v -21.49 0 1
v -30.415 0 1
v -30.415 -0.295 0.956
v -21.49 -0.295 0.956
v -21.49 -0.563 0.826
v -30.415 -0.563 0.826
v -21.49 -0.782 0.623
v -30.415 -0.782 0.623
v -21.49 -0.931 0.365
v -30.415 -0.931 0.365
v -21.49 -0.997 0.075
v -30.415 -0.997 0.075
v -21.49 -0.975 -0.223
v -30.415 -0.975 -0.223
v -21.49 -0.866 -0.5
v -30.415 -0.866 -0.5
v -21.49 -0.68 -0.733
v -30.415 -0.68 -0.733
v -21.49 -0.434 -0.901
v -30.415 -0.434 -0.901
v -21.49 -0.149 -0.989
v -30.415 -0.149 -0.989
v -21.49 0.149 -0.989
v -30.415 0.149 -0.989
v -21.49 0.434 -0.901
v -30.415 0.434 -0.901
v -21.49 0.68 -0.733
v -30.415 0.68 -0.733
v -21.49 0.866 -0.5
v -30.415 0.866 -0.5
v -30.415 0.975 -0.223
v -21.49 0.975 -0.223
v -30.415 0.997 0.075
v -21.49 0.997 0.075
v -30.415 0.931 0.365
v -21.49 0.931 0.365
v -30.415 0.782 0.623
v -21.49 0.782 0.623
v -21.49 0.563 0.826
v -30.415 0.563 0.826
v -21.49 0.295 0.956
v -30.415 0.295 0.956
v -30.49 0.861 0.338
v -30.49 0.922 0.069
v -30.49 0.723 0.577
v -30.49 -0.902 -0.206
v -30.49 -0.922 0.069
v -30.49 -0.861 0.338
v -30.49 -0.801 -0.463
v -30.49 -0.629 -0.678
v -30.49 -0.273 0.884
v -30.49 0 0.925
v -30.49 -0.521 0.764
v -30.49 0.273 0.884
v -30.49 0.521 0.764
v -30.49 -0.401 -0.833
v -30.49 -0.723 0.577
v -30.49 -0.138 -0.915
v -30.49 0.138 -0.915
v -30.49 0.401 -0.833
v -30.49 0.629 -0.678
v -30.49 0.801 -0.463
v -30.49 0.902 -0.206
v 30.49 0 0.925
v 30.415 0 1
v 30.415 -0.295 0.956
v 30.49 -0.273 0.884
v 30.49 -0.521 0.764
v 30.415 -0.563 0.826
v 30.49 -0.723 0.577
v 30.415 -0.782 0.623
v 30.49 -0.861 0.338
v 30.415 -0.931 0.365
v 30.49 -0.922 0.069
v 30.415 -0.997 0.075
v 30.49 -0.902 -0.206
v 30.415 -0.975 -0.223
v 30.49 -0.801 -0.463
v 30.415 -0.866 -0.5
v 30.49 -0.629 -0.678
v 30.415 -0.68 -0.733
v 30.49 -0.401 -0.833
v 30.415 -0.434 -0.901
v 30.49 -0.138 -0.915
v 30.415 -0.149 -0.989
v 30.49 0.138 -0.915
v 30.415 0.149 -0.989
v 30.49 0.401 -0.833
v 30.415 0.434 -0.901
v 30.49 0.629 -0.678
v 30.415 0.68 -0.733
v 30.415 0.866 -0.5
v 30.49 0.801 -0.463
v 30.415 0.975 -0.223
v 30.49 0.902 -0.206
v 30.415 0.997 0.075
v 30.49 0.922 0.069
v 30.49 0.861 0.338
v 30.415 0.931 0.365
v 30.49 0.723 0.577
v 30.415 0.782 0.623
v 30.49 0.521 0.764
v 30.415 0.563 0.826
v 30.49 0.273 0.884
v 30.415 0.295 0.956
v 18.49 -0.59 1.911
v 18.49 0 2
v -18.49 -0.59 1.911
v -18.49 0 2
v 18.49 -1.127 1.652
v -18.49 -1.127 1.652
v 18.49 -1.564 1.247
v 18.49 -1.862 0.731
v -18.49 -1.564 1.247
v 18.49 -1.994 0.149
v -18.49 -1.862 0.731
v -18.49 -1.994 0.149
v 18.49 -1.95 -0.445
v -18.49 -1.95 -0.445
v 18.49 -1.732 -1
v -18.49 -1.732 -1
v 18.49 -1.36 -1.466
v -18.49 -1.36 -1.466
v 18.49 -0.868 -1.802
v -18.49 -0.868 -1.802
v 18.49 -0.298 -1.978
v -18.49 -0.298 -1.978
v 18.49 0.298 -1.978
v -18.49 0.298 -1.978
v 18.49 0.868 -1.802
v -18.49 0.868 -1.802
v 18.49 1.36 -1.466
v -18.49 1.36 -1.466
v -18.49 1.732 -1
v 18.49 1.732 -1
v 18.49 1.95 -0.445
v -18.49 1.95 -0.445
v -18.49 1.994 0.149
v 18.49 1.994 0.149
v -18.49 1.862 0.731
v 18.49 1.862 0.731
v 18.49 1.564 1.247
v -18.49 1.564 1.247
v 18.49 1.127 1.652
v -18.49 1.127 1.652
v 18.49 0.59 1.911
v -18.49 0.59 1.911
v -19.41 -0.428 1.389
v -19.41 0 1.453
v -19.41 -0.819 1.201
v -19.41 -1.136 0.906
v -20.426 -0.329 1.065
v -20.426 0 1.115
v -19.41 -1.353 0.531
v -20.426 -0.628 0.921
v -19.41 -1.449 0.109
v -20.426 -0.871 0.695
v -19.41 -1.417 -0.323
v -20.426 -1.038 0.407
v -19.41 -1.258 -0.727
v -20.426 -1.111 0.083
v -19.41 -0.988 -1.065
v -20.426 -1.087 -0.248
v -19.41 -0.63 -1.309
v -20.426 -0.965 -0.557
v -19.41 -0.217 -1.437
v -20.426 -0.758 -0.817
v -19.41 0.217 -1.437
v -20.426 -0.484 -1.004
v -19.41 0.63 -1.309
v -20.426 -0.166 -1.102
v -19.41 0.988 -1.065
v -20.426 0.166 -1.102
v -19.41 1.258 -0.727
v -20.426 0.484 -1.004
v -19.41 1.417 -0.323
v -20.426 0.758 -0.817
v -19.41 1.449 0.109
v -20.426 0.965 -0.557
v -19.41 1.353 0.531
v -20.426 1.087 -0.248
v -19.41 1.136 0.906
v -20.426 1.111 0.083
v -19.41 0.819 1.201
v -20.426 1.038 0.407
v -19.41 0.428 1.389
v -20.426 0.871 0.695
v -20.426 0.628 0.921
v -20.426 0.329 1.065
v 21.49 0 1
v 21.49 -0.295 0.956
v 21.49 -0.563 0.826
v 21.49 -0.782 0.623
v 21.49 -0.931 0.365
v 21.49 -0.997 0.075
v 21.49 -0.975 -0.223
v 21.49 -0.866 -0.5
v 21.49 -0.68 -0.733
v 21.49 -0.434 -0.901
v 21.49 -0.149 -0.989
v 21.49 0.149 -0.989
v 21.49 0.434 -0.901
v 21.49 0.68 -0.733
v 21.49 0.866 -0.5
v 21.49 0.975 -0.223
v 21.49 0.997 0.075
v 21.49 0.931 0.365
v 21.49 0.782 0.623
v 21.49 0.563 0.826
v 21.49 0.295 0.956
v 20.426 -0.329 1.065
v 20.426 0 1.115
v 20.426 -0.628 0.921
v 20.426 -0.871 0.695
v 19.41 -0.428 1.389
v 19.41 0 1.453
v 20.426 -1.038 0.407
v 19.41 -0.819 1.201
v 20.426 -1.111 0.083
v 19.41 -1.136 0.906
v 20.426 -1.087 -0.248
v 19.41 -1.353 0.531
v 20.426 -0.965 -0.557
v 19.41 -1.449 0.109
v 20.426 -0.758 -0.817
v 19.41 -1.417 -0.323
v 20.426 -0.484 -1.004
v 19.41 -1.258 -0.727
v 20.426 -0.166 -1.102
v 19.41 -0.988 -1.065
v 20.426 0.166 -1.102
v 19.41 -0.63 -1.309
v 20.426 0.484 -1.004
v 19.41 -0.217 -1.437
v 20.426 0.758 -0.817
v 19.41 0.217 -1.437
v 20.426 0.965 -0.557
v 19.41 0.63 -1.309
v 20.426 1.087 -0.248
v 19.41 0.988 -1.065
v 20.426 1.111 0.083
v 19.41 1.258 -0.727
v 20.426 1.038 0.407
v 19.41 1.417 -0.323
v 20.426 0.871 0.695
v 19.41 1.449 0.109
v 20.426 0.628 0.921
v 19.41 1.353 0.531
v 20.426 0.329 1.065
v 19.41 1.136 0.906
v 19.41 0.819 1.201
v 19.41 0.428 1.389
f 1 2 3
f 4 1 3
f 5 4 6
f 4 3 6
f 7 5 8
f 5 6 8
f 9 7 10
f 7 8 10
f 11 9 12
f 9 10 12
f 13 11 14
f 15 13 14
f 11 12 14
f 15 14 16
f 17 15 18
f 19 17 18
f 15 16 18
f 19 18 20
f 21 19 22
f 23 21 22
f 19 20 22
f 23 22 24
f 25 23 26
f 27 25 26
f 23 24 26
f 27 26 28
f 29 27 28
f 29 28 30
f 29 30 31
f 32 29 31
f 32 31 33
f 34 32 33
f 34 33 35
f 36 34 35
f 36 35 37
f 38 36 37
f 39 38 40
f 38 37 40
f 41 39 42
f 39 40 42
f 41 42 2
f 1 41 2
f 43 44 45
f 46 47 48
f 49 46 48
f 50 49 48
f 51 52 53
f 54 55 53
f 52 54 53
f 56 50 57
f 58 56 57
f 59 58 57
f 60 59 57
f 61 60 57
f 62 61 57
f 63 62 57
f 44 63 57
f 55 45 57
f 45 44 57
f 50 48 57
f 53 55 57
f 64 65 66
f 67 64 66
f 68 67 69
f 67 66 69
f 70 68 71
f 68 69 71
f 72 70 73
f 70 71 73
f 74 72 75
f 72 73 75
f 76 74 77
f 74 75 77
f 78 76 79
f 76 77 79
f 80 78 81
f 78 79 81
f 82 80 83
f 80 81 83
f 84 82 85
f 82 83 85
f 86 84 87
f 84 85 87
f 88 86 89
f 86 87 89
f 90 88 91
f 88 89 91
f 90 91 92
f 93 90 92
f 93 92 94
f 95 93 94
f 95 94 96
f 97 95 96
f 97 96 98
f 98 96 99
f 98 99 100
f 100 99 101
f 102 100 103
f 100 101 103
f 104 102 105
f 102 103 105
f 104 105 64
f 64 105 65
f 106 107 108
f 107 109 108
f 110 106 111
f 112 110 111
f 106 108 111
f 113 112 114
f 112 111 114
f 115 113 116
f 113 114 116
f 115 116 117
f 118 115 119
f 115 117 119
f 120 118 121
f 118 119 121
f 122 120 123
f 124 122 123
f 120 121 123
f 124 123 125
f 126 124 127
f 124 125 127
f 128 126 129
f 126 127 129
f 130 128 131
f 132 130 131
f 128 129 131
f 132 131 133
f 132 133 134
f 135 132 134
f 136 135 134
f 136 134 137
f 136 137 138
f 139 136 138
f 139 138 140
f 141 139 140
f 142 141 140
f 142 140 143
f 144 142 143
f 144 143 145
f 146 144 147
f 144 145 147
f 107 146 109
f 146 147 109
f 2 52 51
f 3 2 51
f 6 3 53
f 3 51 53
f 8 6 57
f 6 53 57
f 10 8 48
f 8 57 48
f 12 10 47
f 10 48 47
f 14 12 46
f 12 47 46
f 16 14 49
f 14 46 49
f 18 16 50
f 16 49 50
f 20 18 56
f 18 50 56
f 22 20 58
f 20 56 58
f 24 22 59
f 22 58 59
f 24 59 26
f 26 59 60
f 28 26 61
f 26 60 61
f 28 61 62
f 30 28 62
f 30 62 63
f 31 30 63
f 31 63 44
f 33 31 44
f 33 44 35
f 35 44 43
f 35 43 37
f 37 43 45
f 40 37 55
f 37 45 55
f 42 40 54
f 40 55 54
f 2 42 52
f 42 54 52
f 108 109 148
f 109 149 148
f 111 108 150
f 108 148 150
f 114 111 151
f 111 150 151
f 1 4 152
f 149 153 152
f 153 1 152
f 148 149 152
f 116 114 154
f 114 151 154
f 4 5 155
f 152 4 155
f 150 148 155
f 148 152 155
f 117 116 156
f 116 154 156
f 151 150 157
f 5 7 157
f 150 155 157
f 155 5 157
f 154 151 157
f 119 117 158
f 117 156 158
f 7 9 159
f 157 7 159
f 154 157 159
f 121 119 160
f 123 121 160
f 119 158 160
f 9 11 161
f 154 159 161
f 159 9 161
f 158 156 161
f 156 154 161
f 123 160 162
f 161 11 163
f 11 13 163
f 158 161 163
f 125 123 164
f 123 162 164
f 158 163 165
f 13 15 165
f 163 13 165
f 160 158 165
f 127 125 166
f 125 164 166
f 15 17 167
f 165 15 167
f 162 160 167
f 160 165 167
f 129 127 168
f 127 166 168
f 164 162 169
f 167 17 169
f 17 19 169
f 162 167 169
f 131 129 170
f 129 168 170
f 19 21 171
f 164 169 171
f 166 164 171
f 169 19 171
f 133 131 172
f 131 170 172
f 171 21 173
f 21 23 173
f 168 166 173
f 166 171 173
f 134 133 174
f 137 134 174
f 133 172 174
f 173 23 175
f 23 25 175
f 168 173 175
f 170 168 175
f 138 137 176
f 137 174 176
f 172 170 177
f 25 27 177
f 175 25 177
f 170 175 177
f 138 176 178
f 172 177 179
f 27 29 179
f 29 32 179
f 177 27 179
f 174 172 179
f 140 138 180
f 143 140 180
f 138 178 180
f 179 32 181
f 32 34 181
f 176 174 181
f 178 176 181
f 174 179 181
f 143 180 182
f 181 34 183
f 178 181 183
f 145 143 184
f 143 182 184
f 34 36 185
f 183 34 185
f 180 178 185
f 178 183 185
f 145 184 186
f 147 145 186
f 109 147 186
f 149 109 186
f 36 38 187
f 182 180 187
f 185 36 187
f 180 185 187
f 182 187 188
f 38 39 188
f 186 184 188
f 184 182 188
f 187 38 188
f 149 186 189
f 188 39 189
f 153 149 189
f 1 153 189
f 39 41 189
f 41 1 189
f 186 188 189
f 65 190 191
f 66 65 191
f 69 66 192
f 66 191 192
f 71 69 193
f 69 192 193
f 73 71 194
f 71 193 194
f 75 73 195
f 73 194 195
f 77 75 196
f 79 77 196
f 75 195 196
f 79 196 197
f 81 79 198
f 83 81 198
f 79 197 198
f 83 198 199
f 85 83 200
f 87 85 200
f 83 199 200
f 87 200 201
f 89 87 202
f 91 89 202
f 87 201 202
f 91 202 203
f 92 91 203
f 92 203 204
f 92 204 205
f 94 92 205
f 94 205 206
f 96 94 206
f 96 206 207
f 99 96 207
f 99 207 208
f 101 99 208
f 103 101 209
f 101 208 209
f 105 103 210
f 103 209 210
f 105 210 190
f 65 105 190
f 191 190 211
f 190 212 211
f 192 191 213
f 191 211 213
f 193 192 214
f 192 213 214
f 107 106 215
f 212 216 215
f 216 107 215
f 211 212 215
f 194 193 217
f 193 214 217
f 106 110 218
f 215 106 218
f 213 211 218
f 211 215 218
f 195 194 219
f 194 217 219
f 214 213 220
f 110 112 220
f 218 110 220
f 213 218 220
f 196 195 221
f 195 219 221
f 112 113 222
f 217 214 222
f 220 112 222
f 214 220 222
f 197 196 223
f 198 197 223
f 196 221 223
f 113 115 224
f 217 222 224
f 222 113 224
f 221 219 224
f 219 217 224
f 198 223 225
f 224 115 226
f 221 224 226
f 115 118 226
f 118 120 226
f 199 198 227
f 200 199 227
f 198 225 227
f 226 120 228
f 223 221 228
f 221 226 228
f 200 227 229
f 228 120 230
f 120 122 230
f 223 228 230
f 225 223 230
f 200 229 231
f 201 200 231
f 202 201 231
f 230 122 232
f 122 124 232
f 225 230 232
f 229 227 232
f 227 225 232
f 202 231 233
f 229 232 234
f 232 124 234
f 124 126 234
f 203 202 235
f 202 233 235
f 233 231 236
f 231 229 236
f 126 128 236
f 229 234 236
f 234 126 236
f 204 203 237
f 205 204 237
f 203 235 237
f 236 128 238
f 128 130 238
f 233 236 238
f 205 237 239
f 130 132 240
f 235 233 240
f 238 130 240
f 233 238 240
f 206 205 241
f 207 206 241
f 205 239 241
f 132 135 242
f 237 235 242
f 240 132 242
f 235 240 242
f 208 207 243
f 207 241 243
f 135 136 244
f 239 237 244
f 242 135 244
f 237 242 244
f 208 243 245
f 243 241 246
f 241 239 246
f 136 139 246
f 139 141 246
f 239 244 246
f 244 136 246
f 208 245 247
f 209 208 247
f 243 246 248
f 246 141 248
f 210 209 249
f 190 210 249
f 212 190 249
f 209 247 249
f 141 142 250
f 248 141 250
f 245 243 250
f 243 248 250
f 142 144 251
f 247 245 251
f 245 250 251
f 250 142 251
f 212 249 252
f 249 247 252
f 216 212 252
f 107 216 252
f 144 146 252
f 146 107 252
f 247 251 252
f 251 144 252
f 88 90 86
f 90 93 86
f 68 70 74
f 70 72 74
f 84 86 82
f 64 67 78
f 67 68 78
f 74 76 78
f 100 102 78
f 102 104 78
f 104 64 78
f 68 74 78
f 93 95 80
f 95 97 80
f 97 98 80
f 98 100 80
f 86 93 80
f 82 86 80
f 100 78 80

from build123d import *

# Parameters (mm, degrees)
CHAMFER1_SIZE = 0.075


with BuildPart() as part:
    # Sketch1 → Revolve1 (revolve)
    with BuildSketch(Plane.XY, mode=Mode.PRIVATE) as revolve1_sk:
        with BuildLine():
            Line((-30.49, 0), (30.49, 0))
            Line((30.49, 0), (30.49, 1))
            Line((30.49, 1), (21.49, 1))
            ThreePointArc((21.49, 1), (19.90886117, 1.25658351), (18.49, 2))
            Line((18.49, 2), (-18.49, 2))
            ThreePointArc((-18.49, 2), (-19.90886117, 1.25658351), (-21.49, 1))
            Line((-21.49, 1), (-30.49, 1))
            Line((-30.49, 1), (-30.49, 0))
        make_face()
    revolve(revolve1_sk.sketch.rotate(Axis((-30.49, 0, 0), (1, 0, 0)), 90), axis=Axis((-30.49, 0, 0), (1, 0, 0)))

    # Chamfer1
    chamfer1_edges = [part.edges().sort_by_distance(p)[0] for p in [
        (-30.49, 0, -1),
        (30.49, 0, -1),
    ]]
    chamfer(chamfer1_edges, length=CHAMFER1_SIZE)


solid = part.part
